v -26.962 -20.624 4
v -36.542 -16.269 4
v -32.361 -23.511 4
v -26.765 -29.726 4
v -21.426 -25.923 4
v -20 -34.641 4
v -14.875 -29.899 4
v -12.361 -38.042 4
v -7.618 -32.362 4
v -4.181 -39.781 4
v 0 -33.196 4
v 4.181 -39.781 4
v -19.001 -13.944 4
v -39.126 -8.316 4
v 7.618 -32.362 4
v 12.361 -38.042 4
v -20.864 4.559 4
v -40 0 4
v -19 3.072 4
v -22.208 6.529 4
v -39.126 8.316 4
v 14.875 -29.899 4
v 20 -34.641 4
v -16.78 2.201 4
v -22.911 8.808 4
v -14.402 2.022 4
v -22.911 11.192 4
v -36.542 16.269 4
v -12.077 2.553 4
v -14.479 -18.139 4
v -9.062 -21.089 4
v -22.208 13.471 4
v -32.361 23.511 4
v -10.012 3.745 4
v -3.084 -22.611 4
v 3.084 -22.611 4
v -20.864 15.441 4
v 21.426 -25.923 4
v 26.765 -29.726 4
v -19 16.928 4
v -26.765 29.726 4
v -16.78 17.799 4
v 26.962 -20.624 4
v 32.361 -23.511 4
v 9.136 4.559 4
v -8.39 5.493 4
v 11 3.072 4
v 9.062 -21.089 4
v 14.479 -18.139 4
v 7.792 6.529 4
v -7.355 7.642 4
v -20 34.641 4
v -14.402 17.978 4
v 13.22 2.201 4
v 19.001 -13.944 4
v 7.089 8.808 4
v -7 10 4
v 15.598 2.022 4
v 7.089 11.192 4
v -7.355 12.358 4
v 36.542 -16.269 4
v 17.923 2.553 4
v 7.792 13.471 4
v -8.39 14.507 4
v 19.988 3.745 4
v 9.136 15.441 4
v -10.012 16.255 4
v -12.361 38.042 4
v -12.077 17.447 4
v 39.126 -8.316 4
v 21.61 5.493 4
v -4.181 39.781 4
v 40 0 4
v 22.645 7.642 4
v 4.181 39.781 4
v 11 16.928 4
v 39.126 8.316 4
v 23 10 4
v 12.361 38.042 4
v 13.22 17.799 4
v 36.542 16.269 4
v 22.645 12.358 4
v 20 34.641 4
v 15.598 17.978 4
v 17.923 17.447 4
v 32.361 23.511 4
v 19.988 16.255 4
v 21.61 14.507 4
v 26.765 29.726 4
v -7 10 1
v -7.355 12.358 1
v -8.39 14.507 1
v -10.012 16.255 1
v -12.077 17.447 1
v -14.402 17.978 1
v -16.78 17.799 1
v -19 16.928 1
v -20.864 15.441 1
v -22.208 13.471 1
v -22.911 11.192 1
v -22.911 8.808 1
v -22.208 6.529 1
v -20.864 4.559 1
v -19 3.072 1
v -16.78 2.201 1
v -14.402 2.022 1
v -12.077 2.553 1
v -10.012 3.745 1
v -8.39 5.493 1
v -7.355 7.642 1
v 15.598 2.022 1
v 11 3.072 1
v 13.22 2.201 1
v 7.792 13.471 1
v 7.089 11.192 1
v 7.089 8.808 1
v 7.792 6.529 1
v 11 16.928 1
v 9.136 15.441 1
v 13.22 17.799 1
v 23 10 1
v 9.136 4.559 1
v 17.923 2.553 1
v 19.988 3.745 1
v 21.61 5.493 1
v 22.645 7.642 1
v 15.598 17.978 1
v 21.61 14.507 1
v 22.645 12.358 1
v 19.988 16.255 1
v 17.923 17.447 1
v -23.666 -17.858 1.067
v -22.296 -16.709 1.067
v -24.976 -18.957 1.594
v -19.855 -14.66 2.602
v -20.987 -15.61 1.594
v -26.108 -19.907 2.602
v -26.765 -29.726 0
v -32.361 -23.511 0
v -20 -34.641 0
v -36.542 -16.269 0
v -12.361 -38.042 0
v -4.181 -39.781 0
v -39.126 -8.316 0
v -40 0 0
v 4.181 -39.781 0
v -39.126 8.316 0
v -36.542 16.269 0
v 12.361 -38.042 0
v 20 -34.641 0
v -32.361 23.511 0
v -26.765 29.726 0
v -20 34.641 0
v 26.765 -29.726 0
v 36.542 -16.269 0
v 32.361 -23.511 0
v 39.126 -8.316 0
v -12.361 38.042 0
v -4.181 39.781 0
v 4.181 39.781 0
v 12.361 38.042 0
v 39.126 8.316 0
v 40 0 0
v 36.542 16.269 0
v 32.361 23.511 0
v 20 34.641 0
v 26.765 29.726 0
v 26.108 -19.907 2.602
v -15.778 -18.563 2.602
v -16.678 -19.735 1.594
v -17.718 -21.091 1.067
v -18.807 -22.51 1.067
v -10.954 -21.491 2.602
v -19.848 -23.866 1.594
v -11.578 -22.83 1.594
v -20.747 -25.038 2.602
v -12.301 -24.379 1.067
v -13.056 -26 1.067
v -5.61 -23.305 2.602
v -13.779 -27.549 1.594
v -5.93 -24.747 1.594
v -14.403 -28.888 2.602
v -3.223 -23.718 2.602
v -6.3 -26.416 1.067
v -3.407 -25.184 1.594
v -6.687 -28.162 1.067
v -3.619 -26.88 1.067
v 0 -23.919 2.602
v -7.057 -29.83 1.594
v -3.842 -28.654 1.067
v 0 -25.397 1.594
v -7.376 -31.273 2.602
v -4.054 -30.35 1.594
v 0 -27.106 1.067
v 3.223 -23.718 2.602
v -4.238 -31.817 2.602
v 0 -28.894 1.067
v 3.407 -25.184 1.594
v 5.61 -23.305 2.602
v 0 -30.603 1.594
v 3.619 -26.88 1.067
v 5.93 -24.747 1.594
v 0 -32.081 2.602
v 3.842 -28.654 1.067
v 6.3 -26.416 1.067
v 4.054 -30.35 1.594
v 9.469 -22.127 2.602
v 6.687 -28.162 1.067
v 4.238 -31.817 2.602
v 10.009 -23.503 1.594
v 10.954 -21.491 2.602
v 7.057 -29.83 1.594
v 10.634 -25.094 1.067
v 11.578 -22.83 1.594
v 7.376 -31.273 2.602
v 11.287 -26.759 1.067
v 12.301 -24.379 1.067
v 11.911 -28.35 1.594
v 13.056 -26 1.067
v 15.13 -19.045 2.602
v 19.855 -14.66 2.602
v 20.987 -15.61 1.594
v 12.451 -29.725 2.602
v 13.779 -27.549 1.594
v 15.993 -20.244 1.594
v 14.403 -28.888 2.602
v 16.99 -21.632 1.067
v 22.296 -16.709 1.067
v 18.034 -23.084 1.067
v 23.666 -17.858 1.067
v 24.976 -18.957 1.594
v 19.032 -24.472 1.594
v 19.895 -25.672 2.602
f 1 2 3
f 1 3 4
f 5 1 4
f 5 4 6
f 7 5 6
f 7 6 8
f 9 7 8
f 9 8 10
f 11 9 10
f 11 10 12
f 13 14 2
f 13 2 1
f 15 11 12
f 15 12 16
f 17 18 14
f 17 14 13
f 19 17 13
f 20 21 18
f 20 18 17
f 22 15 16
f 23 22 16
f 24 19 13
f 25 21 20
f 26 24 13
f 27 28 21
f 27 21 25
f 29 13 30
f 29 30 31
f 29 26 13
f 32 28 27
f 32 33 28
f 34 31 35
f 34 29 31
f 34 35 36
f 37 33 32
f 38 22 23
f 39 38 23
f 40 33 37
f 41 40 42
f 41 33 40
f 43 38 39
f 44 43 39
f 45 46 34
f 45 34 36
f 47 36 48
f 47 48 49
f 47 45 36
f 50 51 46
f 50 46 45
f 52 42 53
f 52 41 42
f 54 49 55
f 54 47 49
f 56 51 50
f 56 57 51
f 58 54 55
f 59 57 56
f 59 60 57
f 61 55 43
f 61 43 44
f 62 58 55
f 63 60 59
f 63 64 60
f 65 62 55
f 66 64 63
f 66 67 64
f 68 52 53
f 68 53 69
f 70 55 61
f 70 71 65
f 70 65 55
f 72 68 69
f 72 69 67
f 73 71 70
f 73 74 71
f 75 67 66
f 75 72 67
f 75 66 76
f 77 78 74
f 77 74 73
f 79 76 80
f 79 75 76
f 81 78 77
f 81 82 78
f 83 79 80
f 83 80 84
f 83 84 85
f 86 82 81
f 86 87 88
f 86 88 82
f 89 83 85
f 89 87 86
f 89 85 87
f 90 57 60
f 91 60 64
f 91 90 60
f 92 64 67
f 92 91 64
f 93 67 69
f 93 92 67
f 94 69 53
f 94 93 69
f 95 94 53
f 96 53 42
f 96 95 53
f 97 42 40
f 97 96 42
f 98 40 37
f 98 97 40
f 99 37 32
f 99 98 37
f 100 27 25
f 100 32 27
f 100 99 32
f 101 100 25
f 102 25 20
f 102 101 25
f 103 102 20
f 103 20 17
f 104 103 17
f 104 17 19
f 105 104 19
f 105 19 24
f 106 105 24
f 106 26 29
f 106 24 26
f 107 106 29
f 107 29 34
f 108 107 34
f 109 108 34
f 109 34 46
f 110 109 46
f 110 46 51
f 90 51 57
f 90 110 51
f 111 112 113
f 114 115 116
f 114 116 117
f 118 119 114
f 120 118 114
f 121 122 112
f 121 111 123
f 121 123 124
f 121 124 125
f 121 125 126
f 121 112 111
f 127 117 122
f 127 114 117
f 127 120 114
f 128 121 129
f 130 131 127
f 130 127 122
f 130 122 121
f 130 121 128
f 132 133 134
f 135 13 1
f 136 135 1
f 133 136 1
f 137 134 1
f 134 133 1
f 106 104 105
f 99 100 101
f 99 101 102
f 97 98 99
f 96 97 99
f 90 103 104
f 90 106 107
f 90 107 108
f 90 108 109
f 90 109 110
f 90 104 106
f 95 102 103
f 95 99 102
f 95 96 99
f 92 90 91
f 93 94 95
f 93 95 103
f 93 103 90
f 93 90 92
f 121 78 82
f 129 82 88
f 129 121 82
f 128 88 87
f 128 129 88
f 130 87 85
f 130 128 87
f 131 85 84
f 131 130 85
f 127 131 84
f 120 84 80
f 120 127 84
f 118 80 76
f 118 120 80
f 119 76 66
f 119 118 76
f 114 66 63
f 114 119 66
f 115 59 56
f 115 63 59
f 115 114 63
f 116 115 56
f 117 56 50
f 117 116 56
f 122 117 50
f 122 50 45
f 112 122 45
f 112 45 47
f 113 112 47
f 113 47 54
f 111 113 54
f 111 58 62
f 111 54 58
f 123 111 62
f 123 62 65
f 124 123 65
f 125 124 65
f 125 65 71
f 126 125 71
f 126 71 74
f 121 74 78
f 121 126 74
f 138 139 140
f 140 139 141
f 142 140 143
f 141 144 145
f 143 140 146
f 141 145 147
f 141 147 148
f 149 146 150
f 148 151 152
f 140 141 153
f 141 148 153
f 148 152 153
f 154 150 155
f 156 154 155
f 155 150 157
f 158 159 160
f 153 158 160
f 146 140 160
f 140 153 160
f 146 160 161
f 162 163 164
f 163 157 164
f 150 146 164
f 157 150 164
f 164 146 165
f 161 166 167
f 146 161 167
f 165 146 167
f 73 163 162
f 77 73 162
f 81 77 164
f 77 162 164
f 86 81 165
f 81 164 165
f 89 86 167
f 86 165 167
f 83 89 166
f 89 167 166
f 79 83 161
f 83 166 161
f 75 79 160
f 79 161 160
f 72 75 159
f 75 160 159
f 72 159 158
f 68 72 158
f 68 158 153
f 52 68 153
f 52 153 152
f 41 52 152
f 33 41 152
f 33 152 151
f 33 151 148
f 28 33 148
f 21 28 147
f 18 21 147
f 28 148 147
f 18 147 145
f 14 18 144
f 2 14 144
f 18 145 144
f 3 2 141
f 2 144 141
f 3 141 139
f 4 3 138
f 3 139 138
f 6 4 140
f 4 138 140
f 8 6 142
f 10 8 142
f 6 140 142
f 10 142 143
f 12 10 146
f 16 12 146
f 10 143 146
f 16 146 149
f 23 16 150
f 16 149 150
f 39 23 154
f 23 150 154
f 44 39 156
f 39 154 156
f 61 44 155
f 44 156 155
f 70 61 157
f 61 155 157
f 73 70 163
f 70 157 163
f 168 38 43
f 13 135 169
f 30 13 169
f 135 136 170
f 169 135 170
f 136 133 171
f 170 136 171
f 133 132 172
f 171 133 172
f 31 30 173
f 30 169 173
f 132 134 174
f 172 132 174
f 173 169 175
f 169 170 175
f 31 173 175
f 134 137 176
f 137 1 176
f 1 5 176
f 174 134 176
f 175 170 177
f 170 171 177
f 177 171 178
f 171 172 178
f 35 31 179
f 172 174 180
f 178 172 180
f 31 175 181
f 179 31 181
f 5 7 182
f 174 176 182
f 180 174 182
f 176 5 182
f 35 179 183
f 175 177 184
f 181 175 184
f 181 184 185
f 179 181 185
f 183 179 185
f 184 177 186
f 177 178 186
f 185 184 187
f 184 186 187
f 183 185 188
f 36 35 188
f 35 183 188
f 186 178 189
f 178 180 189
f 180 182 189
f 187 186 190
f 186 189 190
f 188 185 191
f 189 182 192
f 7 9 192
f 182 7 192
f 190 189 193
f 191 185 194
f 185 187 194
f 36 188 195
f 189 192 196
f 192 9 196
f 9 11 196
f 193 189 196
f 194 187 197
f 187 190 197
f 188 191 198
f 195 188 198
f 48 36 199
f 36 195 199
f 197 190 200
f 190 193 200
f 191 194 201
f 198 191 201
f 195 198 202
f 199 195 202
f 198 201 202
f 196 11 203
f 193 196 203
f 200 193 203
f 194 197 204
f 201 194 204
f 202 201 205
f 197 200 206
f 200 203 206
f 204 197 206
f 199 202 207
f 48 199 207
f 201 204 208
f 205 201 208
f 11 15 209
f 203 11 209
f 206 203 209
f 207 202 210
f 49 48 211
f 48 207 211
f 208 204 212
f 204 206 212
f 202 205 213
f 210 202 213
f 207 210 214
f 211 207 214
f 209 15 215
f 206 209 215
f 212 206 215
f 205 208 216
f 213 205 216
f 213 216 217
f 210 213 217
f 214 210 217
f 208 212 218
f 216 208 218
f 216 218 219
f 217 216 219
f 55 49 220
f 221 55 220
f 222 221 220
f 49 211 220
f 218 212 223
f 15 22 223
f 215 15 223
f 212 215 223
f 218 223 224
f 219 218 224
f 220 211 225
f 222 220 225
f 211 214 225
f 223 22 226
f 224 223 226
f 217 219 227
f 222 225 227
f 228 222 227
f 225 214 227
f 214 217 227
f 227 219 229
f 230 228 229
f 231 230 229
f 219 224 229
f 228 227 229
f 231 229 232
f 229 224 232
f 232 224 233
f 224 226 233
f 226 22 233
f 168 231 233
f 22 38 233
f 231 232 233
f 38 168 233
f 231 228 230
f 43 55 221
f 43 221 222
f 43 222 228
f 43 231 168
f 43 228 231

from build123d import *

# Parameters (mm, degrees)
TORUS_R               = 6
TORUS_ANGLE           = 100
TORUS_PLACEMENT_ANGLE = 140
CYLINDER002_R         = 8
CYLINDER002_DEPTH     = 10
CYLINDER001_R         = 8
CYLINDER001_DEPTH     = 10
CYLINDER_R            = 40
CYLINDER_DEPTH        = 4


with BuildPart() as torus:
    # Torus → Torus (revolve)
    with BuildSketch(Plane.XZ):
        with Locations((30, 0)):
            Circle(TORUS_R)
    revolve(axis=Axis((0, 0, 0), (0, 0, 1)), revolution_arc=TORUS_ANGLE)


with BuildPart() as torus_1:
    # Torus placement: moved
    add(torus.part.moved(Location((0, 2, 7))).rotate(Axis((0, 2, 7), (0, 0, -1)), TORUS_PLACEMENT_ANGLE))


with BuildPart() as cylinder002:
    # Cylinder002 → Cylinder002 (new body)
    with BuildSketch(Plane(origin=(15, 10, 1), x_dir=(1, 0, 0), z_dir=(0, 0, 1))):
        Circle(CYLINDER002_R)
    extrude(amount=CYLINDER002_DEPTH)


with BuildPart() as cylinder001:
    # Cylinder001 → Cylinder001 (new body)
    with BuildSketch(Plane(origin=(-15, 10, 1), x_dir=(1, 0, 0), z_dir=(0, 0, 1))):
        Circle(CYLINDER001_R)
    extrude(amount=CYLINDER001_DEPTH)


with BuildPart() as cut002:
    # Cylinder → Cylinder (new body)
    with BuildSketch(Plane.XY):
        Circle(CYLINDER_R)
    extrude(amount=CYLINDER_DEPTH)

    # Cut: cut Cylinder001
    add(cylinder001.part, mode=Mode.SUBTRACT)

    # Cut001: cut Cylinder002
    add(cylinder002.part, mode=Mode.SUBTRACT)

    # Cut002: cut Torus
    add(torus_1.part, mode=Mode.SUBTRACT)


solid = cut002.part
